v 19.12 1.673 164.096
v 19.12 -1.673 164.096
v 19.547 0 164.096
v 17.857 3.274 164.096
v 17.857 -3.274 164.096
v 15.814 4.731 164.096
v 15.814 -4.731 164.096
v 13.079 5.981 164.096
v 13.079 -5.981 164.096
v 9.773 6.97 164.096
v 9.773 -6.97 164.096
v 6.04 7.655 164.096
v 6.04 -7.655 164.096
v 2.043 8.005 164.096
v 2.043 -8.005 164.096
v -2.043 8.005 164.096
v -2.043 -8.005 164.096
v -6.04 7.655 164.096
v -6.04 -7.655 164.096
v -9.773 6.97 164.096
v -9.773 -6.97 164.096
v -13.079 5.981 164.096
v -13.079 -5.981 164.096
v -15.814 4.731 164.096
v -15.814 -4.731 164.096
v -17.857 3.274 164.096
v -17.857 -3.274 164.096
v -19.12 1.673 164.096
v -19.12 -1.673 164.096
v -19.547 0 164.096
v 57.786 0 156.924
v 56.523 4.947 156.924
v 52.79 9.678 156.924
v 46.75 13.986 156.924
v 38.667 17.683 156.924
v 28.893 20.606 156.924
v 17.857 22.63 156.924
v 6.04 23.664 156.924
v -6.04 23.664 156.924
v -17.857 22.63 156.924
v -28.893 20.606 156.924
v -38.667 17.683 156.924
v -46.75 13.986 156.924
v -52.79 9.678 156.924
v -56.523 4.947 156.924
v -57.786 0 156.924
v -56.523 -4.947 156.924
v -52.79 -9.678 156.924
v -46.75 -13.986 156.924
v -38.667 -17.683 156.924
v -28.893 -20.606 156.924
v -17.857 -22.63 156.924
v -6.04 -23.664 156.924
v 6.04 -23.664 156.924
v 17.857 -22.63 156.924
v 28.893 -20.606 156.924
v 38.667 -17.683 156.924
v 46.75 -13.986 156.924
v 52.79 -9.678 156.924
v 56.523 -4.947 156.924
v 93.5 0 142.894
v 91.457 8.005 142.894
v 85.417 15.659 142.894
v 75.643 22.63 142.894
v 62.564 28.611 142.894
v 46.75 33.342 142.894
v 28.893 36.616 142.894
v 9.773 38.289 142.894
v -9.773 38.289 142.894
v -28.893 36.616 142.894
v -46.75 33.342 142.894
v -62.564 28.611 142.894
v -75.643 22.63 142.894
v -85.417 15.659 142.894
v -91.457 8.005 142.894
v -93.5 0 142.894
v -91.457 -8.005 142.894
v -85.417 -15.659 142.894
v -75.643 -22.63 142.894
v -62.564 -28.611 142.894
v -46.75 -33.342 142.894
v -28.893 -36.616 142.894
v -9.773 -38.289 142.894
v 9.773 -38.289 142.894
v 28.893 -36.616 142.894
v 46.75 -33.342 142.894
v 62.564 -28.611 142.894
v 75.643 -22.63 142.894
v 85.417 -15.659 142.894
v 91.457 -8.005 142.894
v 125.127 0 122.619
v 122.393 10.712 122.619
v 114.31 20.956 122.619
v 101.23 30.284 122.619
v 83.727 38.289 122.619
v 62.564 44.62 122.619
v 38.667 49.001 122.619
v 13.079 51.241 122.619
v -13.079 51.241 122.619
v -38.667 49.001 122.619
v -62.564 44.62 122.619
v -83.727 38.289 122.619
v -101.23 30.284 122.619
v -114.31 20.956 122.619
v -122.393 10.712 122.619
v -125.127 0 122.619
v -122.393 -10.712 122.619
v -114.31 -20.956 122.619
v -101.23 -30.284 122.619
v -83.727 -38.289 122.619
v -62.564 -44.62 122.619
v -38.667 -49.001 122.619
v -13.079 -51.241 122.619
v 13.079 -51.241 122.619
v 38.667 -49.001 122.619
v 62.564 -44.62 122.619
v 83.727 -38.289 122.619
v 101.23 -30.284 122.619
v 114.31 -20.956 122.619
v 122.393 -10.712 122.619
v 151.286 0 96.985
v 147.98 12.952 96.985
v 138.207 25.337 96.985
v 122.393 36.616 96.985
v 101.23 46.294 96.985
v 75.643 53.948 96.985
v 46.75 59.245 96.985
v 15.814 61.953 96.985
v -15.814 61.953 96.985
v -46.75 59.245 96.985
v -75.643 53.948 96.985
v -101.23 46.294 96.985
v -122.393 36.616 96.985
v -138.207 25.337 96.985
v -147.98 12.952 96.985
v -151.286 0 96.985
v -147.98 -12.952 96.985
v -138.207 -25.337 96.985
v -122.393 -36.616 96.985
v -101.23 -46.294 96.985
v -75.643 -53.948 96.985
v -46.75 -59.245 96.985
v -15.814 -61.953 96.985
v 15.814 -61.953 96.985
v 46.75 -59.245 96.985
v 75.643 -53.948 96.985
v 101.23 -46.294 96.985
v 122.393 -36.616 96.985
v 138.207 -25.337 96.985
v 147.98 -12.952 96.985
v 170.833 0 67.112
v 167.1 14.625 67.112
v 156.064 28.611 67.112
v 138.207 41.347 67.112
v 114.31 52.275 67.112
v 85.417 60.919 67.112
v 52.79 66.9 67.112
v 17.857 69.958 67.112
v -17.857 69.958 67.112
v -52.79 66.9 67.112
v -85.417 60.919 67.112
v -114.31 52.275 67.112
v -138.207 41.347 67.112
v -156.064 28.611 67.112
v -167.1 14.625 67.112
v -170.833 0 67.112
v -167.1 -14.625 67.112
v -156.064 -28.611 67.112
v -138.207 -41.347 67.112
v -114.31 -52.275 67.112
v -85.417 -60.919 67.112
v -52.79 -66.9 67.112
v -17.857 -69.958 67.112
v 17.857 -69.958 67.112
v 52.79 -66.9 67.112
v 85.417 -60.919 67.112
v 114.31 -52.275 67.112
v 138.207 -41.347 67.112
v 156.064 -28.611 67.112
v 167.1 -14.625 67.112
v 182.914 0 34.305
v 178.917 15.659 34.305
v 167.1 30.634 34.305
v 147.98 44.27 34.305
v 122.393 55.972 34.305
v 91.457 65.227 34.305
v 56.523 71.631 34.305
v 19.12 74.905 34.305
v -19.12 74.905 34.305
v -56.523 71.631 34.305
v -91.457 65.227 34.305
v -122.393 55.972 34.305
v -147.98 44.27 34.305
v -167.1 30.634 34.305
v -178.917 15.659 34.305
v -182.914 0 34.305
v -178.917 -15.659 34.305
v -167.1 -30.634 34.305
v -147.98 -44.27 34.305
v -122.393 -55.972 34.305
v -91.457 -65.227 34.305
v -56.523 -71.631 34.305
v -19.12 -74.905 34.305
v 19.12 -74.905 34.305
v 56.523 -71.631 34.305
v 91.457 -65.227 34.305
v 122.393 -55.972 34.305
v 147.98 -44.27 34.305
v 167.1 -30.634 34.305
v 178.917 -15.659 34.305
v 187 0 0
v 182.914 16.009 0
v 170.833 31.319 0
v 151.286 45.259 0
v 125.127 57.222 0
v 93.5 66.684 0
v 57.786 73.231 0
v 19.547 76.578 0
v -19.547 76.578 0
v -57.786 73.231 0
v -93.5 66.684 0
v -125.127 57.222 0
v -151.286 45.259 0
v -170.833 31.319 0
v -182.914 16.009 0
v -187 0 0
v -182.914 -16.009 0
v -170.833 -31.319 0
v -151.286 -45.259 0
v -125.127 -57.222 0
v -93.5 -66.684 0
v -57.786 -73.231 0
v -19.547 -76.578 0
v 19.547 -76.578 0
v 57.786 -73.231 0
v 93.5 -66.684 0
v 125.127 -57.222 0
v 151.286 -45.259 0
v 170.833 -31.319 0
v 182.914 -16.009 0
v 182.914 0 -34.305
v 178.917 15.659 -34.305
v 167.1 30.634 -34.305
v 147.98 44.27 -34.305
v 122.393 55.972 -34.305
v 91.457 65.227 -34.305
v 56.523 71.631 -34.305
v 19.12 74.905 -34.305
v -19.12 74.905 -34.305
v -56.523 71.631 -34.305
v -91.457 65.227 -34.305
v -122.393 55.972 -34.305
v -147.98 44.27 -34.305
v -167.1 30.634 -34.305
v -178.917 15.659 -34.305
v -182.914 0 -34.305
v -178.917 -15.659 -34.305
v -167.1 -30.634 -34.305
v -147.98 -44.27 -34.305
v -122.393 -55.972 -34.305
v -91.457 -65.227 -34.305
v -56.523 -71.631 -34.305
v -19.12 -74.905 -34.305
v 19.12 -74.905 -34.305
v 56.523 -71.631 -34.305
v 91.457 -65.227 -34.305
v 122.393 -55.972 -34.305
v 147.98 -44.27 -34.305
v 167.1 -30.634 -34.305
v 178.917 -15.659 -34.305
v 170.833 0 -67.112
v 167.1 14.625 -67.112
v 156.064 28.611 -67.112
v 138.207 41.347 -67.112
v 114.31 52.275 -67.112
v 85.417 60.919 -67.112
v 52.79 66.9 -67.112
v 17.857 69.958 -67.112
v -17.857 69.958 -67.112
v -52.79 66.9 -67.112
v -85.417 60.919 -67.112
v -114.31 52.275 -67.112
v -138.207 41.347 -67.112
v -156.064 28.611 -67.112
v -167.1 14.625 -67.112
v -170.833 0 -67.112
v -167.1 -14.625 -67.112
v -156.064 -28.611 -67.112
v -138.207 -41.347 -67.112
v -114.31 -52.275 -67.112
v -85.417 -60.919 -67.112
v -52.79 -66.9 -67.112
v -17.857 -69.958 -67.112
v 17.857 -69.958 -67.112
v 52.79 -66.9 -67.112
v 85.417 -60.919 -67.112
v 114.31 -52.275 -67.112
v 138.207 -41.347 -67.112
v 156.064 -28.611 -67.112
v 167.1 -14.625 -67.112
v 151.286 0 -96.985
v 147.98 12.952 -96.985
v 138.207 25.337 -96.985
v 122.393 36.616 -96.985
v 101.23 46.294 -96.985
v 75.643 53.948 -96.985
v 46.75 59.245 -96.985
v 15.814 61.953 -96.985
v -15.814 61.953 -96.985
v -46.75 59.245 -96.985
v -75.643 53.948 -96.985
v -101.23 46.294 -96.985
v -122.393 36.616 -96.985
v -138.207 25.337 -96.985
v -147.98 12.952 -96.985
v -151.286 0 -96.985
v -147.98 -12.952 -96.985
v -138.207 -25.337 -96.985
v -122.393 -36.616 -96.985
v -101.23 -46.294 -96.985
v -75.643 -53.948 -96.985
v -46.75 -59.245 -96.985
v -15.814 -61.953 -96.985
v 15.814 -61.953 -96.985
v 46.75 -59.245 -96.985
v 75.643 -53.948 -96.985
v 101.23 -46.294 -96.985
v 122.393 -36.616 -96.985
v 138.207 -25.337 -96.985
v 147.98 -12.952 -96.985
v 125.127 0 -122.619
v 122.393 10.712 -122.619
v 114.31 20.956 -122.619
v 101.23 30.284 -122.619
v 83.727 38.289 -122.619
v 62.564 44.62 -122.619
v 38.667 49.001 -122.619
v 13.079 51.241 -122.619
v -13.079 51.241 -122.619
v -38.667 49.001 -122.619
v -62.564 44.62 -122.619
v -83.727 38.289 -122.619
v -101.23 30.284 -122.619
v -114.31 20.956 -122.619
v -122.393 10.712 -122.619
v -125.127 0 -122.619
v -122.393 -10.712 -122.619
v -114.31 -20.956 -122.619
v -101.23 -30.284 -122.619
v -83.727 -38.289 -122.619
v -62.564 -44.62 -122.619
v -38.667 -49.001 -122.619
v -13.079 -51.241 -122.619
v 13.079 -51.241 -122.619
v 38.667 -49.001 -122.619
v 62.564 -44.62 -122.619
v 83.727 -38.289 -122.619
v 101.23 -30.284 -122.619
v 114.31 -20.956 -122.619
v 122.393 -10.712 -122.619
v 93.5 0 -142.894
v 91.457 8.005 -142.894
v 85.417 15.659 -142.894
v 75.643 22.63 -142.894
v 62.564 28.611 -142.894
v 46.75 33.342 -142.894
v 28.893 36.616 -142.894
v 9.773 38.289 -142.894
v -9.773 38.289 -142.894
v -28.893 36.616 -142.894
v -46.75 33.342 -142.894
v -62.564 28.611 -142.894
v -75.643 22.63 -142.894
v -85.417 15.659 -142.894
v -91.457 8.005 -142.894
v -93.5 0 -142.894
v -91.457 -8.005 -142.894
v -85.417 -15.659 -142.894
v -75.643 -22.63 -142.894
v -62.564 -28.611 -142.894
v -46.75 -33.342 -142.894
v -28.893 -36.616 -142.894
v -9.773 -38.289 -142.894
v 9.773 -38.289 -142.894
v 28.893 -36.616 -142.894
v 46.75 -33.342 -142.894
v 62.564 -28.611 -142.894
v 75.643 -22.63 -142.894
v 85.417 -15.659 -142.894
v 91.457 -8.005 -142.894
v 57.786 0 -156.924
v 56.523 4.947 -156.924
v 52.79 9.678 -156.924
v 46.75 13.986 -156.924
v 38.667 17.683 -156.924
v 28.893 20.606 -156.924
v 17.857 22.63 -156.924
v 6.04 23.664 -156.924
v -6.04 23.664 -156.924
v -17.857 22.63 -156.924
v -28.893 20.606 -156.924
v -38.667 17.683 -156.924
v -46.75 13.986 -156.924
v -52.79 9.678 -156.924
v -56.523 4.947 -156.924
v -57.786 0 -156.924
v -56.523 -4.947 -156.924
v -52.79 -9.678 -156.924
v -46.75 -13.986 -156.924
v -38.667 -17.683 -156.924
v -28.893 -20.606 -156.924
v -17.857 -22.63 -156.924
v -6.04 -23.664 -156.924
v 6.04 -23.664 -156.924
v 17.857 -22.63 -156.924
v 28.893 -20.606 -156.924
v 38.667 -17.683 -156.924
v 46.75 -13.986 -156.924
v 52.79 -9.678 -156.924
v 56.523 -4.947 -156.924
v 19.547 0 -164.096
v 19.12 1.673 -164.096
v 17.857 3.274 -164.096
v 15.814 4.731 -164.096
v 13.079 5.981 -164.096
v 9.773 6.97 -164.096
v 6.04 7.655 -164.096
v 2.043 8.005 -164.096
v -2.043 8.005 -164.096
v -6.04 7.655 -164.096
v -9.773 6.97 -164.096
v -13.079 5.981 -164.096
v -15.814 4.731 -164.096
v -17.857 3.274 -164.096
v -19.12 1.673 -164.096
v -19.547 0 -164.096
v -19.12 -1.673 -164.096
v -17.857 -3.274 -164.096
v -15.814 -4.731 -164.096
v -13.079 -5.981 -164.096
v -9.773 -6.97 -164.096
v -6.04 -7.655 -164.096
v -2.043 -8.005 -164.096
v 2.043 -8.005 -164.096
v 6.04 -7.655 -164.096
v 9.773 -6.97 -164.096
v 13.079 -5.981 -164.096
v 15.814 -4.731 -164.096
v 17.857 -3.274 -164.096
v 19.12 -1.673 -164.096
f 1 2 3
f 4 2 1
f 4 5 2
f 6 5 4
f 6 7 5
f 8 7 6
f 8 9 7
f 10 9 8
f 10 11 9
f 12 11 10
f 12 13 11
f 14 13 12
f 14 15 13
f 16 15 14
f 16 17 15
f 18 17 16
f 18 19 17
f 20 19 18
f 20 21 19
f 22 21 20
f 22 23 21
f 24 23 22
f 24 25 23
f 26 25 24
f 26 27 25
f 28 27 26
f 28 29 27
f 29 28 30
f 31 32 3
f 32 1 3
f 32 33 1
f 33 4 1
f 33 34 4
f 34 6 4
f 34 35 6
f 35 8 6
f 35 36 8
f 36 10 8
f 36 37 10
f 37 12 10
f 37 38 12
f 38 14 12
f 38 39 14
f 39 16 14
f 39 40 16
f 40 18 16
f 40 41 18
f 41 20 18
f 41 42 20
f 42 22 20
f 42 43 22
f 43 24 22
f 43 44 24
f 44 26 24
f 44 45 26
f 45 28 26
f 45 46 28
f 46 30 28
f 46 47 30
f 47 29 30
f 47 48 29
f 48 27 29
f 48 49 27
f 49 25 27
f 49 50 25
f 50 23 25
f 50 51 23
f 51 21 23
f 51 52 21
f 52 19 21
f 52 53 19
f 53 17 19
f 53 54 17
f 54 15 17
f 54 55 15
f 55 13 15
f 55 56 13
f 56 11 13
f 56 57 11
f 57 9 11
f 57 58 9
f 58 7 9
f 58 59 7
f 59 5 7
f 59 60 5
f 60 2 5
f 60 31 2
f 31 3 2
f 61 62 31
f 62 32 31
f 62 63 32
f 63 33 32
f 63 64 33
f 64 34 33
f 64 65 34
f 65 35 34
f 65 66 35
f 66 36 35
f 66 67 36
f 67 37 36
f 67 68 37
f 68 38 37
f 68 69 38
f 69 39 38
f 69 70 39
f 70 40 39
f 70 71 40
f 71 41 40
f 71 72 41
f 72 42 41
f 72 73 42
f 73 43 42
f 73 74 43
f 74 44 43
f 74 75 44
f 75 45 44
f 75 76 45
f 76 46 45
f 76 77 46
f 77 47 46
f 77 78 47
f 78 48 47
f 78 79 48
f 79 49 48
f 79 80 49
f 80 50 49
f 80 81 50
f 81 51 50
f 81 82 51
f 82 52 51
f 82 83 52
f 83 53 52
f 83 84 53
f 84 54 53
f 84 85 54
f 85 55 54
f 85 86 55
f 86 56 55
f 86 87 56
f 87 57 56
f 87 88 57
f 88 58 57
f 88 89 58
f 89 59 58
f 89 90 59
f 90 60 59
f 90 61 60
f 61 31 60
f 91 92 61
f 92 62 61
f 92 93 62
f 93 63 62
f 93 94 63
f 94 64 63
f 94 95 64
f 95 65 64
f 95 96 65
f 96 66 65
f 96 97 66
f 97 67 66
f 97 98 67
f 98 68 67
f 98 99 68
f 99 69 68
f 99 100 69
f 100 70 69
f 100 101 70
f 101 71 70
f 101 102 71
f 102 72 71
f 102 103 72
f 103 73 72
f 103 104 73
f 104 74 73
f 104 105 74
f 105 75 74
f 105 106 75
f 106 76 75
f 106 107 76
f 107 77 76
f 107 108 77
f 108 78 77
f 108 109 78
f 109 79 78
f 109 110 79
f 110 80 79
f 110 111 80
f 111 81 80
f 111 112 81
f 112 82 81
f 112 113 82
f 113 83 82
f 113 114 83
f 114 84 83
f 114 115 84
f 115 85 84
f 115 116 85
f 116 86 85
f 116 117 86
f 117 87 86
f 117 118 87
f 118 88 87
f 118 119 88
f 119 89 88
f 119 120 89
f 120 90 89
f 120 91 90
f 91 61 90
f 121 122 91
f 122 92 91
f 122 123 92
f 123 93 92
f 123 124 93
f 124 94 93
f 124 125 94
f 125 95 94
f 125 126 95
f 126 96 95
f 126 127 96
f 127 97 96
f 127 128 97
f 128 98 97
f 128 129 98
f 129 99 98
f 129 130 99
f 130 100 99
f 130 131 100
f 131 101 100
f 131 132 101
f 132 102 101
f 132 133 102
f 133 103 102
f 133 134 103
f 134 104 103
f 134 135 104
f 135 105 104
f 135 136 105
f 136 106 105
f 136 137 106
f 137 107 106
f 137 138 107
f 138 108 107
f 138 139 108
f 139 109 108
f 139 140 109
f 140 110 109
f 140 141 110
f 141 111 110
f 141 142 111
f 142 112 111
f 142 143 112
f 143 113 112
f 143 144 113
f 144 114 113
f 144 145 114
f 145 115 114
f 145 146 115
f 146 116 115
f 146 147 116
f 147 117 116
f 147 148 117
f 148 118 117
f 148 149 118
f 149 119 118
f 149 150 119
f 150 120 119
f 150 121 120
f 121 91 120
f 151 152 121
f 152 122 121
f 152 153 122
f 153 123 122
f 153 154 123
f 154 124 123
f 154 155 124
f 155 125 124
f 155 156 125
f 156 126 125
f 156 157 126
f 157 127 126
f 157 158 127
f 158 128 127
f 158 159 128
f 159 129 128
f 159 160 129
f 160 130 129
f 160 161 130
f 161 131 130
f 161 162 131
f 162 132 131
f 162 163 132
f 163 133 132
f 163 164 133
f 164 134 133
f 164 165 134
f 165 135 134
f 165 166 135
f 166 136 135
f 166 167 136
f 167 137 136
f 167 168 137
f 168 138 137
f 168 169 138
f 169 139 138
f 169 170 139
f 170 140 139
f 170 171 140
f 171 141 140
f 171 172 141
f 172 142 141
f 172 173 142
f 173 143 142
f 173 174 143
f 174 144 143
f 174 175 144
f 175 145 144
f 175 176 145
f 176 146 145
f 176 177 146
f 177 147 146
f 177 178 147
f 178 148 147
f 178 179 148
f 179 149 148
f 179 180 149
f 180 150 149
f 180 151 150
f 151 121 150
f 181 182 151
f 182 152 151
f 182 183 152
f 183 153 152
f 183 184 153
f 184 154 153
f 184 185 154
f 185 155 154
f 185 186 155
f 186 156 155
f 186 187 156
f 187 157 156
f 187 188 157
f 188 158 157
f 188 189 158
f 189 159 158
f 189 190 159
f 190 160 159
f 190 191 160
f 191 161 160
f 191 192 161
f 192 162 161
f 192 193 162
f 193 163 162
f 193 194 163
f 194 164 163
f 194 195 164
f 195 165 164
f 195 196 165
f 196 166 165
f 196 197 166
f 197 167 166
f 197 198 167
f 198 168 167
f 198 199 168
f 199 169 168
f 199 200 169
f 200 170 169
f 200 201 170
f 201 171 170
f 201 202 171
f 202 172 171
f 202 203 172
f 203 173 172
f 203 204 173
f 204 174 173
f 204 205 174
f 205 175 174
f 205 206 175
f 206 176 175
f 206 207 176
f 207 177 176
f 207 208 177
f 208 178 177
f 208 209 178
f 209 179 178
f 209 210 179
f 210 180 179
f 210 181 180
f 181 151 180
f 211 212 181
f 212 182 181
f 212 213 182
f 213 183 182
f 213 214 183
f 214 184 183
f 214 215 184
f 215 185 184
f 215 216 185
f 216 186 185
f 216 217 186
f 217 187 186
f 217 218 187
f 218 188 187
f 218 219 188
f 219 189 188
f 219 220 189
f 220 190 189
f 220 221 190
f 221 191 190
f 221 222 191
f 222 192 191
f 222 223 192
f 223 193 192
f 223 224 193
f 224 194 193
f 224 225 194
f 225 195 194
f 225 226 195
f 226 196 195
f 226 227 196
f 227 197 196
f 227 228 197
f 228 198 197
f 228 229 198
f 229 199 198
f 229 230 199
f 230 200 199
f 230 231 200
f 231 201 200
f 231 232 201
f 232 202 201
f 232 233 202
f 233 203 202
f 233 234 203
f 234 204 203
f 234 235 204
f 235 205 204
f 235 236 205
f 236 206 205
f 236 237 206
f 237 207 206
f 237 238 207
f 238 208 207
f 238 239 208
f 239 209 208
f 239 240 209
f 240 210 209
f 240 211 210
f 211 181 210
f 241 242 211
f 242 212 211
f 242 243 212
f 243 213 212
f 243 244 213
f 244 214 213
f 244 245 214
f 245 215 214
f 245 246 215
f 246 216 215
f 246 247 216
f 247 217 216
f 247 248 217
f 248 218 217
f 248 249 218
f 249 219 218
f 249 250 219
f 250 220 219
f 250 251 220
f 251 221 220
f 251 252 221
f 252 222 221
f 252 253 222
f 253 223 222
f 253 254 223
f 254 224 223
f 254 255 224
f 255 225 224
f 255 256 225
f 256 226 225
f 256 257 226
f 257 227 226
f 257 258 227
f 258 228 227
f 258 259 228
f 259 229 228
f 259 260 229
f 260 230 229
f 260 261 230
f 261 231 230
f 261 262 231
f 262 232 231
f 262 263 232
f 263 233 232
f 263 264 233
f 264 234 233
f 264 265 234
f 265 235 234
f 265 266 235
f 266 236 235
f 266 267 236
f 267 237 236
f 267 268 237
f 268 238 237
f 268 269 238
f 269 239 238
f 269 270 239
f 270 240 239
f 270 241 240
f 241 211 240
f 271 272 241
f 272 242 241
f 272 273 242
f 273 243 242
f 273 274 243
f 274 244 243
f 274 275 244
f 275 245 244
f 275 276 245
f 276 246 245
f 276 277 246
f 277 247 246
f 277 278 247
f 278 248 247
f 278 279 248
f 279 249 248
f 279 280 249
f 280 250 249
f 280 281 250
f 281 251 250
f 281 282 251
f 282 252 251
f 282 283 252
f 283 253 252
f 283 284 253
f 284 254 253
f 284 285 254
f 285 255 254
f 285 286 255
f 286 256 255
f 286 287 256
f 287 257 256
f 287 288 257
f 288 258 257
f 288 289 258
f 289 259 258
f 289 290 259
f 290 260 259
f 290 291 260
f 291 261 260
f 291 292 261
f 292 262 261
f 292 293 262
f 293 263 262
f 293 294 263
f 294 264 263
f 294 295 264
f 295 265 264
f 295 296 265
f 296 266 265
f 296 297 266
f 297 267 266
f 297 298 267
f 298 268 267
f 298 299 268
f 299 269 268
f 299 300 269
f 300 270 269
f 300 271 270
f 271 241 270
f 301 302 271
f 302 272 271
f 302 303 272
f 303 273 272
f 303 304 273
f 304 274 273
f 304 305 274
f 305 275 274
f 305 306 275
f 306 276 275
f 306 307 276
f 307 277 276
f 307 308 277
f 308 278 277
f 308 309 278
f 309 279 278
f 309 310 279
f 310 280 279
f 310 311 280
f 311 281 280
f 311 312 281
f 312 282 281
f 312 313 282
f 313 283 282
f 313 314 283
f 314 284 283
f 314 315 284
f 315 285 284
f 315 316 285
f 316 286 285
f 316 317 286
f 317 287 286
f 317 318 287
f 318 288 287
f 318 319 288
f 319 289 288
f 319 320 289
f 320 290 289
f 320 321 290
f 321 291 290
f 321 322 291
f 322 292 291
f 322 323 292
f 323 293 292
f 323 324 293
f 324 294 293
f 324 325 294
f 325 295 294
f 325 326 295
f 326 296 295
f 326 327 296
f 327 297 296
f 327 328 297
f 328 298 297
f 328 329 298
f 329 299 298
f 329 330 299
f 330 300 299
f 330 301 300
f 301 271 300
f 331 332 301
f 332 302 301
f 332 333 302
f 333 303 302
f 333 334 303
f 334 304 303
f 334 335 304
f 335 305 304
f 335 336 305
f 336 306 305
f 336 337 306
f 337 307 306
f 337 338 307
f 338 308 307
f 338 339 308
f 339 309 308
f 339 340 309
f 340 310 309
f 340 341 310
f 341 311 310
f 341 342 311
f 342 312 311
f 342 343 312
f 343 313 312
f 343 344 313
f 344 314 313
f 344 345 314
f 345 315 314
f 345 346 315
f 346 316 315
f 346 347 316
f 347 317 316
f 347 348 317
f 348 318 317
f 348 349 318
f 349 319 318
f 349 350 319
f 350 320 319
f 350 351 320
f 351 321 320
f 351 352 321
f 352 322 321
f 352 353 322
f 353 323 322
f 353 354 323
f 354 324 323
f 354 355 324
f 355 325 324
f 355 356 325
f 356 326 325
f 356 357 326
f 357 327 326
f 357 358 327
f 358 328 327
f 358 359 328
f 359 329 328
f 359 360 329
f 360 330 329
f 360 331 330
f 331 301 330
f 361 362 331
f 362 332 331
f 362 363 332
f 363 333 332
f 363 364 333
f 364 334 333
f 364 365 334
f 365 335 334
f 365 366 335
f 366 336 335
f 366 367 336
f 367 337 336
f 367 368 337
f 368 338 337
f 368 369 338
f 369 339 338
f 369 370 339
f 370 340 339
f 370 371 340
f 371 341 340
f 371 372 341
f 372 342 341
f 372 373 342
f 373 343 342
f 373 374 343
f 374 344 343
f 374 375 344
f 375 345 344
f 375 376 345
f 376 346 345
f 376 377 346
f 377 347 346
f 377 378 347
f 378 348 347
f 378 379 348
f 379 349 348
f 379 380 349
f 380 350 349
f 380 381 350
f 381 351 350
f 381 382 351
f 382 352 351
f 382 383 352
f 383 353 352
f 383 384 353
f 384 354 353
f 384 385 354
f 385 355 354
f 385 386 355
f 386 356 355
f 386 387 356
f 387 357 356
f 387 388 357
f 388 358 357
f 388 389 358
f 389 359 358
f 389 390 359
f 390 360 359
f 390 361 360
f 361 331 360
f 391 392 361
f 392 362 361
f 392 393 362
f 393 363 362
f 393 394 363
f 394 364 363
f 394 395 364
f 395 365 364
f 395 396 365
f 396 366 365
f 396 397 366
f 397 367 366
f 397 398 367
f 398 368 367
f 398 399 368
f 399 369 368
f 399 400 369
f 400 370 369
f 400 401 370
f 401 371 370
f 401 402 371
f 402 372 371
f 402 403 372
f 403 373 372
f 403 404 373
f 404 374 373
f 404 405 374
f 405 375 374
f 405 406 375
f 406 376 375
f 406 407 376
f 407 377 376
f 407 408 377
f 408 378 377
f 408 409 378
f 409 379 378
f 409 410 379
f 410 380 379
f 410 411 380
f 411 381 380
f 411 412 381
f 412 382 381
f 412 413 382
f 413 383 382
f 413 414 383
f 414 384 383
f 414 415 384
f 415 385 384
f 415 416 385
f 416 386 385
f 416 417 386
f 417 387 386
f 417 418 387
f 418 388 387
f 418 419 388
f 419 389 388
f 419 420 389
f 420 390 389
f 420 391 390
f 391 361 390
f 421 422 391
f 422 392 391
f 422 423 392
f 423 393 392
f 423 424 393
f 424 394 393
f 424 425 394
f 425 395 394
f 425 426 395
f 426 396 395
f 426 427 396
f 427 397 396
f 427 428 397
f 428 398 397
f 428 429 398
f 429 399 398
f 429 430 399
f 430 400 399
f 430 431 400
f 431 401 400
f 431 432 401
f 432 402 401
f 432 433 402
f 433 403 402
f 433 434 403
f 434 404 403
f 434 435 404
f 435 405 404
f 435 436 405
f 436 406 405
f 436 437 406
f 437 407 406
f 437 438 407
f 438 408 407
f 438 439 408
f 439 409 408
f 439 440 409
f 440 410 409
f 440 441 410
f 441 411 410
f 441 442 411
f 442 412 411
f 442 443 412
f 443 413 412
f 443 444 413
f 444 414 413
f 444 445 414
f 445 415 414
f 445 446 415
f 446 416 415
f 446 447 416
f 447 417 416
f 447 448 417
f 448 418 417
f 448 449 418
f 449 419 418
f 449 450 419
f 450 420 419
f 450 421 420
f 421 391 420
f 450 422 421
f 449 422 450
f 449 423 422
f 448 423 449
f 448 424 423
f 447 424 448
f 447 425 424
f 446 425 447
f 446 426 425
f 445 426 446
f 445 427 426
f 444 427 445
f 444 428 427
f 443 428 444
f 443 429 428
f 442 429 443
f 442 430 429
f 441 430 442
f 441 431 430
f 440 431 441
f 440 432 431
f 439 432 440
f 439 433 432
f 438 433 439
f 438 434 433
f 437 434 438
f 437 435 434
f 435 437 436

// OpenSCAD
// Generated by SolidPython 1.0.1 on 2020-07-29 00:46:52


scale(v = [17, 7, 15]) {
	sphere(r = 11);
}
/***********************************************
*********      SolidPython code:      **********
************************************************
 
# import packages: SolidPython
from solid import *
from solid.utils import *
from itertools import chain, combinations, permutations


class Resize:

    def __init__(self, scad_file):
        self.scad_file = scad_file
        #self.scad_file = import_scad(scad_file)
        # cone/cylinder param:
        self.r1 = 0
        self.r2 = 0
        self.h = 0
        # rectangular prism param:
        self.w = 0
        self.l = 0
        # ellipse param:
        self.r = 0

    # import OpenScad code (file name corresponds to shape)


    # classify shape + parameters
    def assign(self, param1, param2, param3):
        if self.scad_file == 'cone.scad':
            self.r1 = param1
            self.r2 = param2
            self.h = param3
        elif self.scad_file == 'cylinder.scad':
            self.r1 = param1
            self.r2 = param2
            self.h = param3
        elif self.scad_file == 'rectangularPrism.scad':
            self.h = param1
            self.l = param2
            self.w = param3
        else:
            self.r = param1
            self.h = param2

    # resize parameters
    def iterate(self):
        x = range(3, 20, 2)
        i = 1
        if self.scad_file == 'cone.scad':
            tempList = list(permutations(x, 2))
            for temp in tempList:
                param1 = temp[0]
                param2 = temp[1]
                filepath = 'produced_scad_files/' + 'cone' + str(param1) + '_' + str(param2) + '_' + '.scad'
                scad_render_to_file(cylinder(h=param1, r1=param2, r2=0), filepath)

        elif self.scad_file == 'cylinder.scad':
            tempList = list(permutations(x, 3))
            for temp in tempList:
                param1 = temp[0]
                param2 = temp[1]
                filepath = 'produced_scad_files/' + 'cylinder' + str(param1) + '_' + str(param2) + '_' + '.scad'
                scad_render_to_file(cylinder(h=param1, r1=param2, r2=param2), filepath)

        elif self.scad_file == 'rectangularPrism.scad':
            tempList = list(permutations(x, 3))
            for temp in tempList:
                param1 = temp[0]
                param2 = temp[1]
                param3 = temp[2]
                filepath = 'produced_scad_files/' + 'rectangularPrism' + str(param1) + '_' + str(param2) + '_' + str(
                    param3) + '.scad'
                scad_render_to_file(cube(size=(param1, param2, param3)), filepath)

        elif self.scad_file == 'ellipse.scad':
            tempList = list(permutations(x, 4))
            for temp in tempList:
                param1 = temp[0]
                param2 = temp[1]
                param3 = temp[2]
                param4 = temp[3]
                filepath = 'produced_scad_files/' + 'ellipse' + str(param1) + '_' + str(param2) + '_' + str(param3) + '_' + str(param4) + '.scad'
                scad_render_to_file(scale([param1, param2, param3])(sphere(r=param4)), filepath)

    def render_to_scadfile(self):
        scad_render_to_file(scad, 'example.scad') 
 
************************************************/
